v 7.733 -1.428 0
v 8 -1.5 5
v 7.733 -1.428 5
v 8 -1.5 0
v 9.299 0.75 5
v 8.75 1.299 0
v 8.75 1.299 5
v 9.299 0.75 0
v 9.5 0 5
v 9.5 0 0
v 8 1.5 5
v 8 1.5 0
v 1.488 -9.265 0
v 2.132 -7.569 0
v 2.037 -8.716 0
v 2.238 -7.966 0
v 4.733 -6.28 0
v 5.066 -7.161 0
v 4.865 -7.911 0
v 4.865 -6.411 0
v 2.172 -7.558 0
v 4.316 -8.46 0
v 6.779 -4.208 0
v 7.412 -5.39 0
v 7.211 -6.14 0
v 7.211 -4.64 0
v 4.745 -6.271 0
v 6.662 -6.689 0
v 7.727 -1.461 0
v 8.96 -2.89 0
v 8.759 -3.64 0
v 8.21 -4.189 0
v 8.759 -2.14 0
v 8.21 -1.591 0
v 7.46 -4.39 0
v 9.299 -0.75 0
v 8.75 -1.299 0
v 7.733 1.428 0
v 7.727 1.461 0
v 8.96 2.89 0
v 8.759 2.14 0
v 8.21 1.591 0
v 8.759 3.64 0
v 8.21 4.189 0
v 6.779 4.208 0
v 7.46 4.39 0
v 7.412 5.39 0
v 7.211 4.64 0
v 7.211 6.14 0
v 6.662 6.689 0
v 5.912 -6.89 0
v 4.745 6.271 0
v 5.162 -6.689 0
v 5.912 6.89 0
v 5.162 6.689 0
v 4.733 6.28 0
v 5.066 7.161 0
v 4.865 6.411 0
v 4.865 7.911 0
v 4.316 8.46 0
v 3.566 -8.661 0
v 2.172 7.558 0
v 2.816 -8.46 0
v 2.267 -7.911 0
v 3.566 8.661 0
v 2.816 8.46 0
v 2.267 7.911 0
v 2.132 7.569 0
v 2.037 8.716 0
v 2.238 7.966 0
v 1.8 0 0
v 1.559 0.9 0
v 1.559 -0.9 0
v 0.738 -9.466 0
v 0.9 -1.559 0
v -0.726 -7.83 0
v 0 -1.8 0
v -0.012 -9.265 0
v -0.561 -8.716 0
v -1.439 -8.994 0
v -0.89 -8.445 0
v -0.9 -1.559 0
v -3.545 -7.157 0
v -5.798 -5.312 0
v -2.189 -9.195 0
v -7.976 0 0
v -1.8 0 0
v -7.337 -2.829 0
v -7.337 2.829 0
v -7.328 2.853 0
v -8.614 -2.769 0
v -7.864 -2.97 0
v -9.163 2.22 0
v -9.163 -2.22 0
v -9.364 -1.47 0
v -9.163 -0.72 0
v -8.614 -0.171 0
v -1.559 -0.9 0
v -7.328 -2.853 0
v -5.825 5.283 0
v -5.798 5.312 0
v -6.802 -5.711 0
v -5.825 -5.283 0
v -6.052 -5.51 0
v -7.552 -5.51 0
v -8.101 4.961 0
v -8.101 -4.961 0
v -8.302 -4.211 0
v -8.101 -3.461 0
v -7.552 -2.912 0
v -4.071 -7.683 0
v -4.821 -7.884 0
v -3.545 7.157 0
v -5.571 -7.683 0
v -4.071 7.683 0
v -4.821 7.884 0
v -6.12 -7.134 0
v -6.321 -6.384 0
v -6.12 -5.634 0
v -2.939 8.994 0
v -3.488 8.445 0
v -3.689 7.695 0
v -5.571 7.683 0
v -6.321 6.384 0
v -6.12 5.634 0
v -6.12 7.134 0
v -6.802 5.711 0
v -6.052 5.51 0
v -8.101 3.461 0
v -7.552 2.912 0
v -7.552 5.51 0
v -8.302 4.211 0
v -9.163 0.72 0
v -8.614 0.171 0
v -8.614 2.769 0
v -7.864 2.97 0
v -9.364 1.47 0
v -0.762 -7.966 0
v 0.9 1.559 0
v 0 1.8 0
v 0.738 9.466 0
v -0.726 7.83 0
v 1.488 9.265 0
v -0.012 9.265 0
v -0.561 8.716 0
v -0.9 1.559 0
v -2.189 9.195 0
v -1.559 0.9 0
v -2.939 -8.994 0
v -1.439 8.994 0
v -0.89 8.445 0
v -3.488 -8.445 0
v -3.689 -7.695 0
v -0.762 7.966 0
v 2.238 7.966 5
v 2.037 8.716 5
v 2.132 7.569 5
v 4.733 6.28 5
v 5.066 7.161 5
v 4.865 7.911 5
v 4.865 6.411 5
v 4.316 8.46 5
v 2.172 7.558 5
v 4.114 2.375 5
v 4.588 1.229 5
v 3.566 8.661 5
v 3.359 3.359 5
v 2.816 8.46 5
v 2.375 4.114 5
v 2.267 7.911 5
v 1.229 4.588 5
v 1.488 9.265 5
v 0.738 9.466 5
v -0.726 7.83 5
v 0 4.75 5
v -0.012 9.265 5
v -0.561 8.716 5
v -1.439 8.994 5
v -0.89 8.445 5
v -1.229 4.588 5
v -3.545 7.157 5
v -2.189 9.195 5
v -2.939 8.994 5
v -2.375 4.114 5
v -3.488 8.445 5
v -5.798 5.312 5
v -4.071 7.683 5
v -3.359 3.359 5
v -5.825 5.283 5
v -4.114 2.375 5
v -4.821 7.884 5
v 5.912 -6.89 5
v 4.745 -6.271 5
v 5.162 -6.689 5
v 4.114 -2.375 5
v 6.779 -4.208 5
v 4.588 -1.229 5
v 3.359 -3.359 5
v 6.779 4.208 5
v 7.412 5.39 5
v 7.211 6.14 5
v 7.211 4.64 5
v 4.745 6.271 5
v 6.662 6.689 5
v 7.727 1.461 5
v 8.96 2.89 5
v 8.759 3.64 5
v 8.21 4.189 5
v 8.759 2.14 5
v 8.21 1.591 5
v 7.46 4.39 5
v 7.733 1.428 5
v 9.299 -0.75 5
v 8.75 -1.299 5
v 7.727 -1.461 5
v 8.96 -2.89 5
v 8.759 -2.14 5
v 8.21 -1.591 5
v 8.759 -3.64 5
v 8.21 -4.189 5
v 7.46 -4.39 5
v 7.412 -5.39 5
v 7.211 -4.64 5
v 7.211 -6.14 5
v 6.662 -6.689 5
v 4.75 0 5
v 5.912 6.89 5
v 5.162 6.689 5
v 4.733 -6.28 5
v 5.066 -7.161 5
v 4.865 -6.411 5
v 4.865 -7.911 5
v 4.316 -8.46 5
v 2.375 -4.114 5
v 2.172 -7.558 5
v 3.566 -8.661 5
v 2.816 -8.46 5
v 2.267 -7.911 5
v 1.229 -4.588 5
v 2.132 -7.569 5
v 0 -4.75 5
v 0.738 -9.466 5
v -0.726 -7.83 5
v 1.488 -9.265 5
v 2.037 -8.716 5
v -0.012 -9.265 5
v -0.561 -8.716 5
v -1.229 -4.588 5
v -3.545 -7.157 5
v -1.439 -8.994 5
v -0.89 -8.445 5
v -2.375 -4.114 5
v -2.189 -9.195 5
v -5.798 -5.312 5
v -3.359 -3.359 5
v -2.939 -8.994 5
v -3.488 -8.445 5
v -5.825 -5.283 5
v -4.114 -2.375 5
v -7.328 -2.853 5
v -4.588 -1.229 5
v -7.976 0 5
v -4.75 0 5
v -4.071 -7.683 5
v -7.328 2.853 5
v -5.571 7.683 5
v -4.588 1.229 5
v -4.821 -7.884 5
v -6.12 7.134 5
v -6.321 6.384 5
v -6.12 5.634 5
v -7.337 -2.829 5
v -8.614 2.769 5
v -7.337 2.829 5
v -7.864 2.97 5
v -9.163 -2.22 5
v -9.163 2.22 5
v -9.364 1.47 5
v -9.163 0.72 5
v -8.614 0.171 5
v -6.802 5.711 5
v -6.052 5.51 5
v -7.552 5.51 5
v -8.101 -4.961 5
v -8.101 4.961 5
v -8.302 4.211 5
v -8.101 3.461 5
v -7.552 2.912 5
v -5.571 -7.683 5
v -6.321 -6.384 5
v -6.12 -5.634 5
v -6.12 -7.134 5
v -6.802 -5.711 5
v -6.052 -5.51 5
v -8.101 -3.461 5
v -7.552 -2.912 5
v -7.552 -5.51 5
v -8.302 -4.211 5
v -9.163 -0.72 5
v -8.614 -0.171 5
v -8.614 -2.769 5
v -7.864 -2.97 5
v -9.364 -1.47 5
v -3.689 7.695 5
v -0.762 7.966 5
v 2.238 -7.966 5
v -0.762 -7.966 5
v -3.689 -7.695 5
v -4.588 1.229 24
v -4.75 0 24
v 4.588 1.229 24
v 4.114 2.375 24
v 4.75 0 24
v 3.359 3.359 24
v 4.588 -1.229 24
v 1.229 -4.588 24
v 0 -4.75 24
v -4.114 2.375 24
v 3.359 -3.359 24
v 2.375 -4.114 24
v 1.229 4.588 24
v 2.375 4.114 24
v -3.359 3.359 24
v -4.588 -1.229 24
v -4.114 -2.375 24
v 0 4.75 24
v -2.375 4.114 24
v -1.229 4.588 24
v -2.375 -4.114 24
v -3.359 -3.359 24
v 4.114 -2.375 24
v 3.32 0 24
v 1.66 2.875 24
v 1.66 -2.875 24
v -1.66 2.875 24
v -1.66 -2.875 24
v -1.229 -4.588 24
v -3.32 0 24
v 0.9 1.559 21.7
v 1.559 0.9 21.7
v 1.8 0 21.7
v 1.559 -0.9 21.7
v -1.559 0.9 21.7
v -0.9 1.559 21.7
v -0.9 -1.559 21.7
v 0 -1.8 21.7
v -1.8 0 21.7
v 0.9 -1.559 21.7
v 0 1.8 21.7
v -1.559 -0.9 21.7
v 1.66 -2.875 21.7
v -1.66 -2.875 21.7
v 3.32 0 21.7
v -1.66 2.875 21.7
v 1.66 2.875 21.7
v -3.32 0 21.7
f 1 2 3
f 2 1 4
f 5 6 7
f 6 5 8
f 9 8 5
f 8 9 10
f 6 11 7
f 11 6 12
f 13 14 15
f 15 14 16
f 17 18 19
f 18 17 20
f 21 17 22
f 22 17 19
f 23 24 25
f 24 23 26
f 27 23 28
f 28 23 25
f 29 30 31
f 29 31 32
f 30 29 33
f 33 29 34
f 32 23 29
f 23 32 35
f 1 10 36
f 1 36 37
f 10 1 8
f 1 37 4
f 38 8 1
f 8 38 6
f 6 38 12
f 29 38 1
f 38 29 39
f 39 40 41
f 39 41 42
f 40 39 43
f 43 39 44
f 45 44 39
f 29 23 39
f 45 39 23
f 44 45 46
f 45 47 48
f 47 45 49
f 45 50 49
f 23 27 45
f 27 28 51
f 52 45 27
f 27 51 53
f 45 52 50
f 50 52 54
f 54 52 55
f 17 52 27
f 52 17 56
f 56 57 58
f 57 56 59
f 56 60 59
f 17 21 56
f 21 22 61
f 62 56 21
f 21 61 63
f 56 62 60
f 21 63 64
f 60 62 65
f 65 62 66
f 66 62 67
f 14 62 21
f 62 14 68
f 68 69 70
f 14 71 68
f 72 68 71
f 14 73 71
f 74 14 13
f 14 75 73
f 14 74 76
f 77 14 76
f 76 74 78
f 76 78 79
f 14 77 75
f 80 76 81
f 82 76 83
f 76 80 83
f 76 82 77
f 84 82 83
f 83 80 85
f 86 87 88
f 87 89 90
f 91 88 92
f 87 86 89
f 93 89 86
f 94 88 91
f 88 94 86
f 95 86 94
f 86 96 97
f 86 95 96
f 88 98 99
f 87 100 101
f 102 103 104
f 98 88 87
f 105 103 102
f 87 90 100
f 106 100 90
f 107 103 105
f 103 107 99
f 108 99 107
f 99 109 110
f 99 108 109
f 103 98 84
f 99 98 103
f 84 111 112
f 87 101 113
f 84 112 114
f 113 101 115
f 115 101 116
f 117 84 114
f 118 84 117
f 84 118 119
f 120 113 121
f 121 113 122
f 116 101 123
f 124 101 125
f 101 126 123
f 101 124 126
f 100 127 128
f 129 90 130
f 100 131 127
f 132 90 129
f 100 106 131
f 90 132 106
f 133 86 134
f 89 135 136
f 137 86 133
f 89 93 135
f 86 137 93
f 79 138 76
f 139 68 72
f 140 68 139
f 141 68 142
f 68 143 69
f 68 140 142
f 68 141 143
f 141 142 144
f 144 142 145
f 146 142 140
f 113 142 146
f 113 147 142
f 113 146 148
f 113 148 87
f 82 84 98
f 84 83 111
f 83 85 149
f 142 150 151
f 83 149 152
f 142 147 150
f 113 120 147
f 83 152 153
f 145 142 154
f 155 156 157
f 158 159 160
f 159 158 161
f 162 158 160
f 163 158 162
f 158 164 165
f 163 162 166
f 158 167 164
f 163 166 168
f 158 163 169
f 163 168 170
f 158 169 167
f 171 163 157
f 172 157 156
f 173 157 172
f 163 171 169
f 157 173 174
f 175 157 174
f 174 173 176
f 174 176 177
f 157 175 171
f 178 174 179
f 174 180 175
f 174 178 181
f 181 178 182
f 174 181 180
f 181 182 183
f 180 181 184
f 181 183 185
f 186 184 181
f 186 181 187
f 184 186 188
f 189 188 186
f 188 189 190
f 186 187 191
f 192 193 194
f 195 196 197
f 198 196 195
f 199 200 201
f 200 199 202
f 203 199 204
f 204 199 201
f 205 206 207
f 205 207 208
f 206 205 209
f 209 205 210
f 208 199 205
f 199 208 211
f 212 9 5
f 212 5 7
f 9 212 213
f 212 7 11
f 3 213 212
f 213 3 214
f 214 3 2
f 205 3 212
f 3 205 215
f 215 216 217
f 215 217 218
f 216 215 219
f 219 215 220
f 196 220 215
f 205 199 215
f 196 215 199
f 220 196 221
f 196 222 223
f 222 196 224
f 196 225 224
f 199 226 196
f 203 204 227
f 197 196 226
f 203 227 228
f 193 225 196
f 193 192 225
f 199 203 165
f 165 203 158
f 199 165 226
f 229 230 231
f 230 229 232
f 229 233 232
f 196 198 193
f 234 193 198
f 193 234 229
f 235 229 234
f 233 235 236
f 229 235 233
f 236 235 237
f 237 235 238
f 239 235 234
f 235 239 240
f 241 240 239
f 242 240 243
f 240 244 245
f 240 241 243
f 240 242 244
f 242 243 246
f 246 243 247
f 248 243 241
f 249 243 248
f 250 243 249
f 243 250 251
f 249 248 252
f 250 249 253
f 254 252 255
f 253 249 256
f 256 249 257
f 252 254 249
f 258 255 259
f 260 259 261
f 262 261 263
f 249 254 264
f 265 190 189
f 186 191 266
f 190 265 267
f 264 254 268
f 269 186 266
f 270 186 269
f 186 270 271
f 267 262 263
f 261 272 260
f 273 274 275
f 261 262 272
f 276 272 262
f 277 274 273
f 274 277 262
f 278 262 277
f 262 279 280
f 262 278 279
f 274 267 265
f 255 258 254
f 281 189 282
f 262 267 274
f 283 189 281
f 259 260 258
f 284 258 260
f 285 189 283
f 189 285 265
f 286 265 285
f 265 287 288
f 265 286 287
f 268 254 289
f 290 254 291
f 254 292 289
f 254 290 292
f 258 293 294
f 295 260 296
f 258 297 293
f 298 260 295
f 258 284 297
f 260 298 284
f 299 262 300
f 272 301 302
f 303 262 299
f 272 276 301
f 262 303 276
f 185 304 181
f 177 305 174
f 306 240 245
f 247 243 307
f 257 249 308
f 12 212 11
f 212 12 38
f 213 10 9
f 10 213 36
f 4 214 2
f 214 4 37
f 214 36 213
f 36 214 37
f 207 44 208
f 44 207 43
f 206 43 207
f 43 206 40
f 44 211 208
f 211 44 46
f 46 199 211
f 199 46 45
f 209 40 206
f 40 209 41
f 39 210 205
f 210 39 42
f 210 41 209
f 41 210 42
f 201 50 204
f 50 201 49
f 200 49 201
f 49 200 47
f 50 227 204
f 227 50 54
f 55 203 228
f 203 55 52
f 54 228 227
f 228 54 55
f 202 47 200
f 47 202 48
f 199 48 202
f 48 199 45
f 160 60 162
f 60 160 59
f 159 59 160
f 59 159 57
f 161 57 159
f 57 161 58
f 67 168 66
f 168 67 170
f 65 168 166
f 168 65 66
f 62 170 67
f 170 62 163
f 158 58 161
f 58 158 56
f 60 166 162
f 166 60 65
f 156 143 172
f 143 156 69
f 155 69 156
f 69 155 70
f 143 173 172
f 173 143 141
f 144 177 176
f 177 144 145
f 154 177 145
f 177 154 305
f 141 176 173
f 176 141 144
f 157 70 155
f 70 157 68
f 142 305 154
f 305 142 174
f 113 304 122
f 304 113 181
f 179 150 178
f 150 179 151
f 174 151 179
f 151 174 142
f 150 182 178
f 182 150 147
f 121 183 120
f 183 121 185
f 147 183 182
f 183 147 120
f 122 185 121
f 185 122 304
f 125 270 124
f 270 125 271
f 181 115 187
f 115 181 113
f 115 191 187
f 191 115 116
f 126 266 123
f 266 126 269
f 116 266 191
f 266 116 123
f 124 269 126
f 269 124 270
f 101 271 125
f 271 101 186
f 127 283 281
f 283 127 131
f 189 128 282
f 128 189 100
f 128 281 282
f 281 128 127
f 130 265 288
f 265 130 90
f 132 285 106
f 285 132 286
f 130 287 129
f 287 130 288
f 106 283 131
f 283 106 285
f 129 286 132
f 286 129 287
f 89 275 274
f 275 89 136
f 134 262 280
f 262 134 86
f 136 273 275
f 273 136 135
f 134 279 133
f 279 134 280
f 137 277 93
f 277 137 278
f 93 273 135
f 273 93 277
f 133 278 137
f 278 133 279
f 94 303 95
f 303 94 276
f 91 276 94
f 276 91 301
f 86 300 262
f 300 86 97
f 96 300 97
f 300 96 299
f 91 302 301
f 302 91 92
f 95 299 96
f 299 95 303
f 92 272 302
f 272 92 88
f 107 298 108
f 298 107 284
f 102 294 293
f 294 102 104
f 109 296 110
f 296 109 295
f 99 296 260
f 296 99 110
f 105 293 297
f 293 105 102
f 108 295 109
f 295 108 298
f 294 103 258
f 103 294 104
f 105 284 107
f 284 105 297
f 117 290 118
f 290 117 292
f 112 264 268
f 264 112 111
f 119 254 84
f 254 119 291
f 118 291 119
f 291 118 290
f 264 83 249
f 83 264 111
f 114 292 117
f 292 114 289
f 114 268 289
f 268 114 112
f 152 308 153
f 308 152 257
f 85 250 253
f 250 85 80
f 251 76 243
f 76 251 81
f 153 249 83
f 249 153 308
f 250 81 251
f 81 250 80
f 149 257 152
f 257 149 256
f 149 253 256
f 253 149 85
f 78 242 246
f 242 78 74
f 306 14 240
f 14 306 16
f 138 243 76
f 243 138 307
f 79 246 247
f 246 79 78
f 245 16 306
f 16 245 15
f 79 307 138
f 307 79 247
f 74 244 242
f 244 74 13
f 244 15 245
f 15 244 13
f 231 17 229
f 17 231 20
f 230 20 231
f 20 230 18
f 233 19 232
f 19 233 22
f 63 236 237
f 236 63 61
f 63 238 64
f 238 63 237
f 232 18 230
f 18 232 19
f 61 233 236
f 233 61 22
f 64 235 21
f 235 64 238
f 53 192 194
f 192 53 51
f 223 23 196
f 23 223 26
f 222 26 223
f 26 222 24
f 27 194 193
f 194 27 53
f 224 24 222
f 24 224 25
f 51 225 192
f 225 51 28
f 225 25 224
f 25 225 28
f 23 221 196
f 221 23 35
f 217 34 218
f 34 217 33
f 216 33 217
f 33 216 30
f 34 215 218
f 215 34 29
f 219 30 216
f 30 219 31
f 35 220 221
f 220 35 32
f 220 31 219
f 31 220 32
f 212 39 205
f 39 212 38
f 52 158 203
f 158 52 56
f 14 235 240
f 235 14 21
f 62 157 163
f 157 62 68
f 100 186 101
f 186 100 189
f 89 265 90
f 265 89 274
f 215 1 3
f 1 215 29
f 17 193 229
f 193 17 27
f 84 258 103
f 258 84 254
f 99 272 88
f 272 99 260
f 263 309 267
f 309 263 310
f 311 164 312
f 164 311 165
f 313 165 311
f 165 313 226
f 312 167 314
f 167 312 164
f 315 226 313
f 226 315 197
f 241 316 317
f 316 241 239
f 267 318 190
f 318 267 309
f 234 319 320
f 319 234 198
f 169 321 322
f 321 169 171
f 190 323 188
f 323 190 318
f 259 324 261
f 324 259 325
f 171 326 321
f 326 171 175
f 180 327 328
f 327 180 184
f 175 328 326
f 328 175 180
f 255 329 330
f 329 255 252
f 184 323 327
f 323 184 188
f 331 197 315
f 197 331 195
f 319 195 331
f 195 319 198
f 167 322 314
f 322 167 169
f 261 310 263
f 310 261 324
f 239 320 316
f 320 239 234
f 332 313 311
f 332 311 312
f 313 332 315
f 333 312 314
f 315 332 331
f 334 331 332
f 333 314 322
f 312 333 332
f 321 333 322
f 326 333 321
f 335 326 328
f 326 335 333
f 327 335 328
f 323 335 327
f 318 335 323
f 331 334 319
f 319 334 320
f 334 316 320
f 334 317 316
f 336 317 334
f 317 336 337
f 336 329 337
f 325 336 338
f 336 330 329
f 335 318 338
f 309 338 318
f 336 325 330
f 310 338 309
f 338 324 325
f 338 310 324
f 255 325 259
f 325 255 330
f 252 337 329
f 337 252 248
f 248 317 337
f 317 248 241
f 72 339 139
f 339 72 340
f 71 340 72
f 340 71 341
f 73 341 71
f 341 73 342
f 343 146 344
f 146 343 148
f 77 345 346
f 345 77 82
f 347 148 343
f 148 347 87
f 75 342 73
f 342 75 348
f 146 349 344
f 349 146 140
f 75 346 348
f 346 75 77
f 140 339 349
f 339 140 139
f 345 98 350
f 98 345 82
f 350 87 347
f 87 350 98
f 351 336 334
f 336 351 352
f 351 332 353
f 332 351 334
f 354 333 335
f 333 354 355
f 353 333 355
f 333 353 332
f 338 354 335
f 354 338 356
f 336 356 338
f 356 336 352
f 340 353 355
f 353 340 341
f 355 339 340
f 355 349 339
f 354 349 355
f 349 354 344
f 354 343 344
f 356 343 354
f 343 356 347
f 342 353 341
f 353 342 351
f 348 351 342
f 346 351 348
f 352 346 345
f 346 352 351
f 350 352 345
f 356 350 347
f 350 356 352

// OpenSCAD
height = 24;
thick_height = 5;
diameter = 9.5;
thick_diameter = 16;

hole_diameter_tolerance = 0.7;
hole_diameter_base_size = 2.9;
nut_thickness = 2.3;
nut_width_tolerance = 0.35;
nut_width_base_size = 5.4;

module dummy() {}

hole_diameter = hole_diameter_base_size + hole_diameter_tolerance;
nut_width = nut_width_base_size + nut_width_tolerance;

nudge = 0.001;

pi = 3.141592653589793;

module knurledCylinder(h=10,r1=5,r2=1.5) {
    n = ceil(2 * pi * r1 / (2 * r2));
    cylinder(h=h,r=r1,$fn=n);
    for (i=[0:n-1]) {
        x = r1*cos(360./n*i);
        y = r1*sin(360./n*i);
        translate([x,y,0]) cylinder(h=h,r=r2,$fn=12);
    }
}

render(convexity=10)
difference() {
    union() {
        cylinder(h=height,r=diameter/2,$fn=24);
        knurledCylinder(h=thick_height,r1=thick_diameter/2);
    }
    translate([0,0,-nudge]) cylinder(h=height+2*nudge,d=hole_diameter,$fn=12);
    translate([0,0,height-nut_thickness])
    cylinder(h=nut_thickness+nudge,d=nut_width*2/sqrt(3), $fn=6);
}
